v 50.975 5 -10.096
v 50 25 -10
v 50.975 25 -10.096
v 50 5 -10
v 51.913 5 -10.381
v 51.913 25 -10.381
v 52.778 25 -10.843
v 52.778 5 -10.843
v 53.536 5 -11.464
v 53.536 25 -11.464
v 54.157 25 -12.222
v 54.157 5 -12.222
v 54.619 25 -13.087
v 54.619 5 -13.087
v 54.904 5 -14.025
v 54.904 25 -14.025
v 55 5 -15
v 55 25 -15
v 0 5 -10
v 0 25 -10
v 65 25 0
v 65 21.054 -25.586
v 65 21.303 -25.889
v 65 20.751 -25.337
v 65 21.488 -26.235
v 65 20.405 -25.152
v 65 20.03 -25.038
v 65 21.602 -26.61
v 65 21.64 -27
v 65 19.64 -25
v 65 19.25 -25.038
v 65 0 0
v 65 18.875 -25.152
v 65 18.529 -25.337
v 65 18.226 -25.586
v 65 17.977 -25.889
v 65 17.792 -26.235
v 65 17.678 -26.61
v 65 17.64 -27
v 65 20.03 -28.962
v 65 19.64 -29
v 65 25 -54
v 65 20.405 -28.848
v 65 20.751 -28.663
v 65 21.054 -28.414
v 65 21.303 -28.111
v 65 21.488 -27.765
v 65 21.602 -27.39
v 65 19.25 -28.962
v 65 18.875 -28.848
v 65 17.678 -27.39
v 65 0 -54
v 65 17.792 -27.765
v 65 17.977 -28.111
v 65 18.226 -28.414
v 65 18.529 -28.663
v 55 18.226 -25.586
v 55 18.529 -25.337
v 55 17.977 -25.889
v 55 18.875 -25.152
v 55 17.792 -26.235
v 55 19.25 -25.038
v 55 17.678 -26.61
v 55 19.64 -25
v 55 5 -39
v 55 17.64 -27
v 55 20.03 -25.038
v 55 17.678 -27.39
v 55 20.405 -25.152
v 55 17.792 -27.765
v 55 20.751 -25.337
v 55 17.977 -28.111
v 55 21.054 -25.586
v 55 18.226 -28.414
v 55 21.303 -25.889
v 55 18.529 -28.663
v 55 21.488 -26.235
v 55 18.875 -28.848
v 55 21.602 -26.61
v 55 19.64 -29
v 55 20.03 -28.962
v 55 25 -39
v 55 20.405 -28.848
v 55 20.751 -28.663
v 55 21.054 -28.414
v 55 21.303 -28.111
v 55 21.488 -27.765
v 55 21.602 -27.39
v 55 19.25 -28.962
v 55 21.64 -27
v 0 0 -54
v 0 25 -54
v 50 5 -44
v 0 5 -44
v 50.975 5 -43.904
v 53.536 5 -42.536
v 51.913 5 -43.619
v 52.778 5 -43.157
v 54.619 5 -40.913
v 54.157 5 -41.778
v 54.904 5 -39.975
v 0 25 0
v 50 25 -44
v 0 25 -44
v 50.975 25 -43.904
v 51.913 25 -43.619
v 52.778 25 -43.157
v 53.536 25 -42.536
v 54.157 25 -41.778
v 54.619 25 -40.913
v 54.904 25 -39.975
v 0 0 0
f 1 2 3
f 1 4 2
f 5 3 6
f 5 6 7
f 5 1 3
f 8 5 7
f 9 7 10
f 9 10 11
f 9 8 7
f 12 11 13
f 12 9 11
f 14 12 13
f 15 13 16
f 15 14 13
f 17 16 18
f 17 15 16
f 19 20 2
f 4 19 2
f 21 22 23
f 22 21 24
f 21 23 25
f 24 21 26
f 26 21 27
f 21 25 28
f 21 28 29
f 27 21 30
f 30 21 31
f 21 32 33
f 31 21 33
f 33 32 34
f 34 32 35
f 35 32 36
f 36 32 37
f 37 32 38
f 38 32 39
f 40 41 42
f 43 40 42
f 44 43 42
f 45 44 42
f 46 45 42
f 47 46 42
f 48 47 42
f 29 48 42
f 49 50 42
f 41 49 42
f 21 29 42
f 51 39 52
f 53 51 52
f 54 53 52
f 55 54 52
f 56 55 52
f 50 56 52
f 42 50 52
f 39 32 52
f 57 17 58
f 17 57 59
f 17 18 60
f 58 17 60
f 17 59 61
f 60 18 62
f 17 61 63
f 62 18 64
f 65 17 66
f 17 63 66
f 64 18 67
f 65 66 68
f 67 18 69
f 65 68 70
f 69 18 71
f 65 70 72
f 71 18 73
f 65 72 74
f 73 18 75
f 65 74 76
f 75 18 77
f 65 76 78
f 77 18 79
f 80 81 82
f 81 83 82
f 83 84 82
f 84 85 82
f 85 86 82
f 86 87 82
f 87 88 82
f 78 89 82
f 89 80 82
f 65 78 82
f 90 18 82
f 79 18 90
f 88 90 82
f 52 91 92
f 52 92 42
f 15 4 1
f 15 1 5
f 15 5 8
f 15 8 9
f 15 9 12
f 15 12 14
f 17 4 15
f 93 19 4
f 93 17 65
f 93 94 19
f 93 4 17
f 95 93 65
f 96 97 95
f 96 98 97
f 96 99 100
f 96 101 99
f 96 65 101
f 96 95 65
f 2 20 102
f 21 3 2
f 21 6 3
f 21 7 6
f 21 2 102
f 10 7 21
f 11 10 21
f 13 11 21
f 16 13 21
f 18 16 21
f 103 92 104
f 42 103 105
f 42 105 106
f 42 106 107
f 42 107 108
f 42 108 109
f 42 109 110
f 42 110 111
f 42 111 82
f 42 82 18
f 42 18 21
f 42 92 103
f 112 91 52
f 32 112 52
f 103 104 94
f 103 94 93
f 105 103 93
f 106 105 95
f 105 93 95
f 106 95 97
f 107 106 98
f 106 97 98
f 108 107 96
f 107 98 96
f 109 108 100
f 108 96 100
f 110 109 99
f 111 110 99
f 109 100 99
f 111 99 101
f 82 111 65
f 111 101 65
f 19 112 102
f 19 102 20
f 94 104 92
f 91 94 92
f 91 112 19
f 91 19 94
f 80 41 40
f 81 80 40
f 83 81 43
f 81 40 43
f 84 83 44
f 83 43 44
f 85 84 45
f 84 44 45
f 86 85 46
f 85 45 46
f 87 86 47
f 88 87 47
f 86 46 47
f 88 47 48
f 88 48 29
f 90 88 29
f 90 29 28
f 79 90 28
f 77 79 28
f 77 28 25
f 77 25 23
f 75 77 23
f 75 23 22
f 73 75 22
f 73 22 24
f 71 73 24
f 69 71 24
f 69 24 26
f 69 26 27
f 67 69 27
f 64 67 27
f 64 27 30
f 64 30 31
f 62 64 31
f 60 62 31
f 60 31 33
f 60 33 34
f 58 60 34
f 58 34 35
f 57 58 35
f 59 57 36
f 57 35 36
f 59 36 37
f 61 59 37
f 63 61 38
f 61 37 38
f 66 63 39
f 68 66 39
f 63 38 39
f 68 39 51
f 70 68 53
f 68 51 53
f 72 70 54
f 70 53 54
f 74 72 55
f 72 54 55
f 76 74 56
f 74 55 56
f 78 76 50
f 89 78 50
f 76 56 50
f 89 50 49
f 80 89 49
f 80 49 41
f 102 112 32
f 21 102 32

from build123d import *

# Parameters (mm, degrees)
SKETCH1_W           = 65
SKETCH1_H           = 54
BOSS_EXTRUDE1_DEPTH = 25
SKETCH2_W           = 55
SKETCH2_H           = 34
CUT_EXTRUDE1_DEPTH  = 20
SKETCH3_R           = 2
CUT_EXTRUDE2_DEPTH  = 66
FILLET1_R           = 5


with BuildPart() as part:
    # Sketch1 → Boss-Extrude1 (new body)
    with BuildSketch(Plane(origin=(0, 0, 0), x_dir=(1, 0, 0), z_dir=(0, 1, 0))):
        with Locations((32.5, 27)):
            Rectangle(SKETCH1_W, SKETCH1_H)
    extrude(amount=BOSS_EXTRUDE1_DEPTH)

    # Sketch2 → Cut-Extrude1 (cut)
    with BuildSketch(Plane(origin=(0, 25, 0), x_dir=(1, 0, 0), z_dir=(0, 1, 0))):
        with Locations((27.5, 27)):
            Rectangle(SKETCH2_W, SKETCH2_H)
    extrude(amount=-CUT_EXTRUDE1_DEPTH, mode=Mode.SUBTRACT)

    # Sketch3 → Cut-Extrude2 (cut, through all)
    with BuildSketch(Plane(origin=(65, 0, 0), x_dir=(0, 0, -1), z_dir=(1, 0, 0))):
        with Locations((27, 19.64)):
            Circle(SKETCH3_R)
    extrude(amount=-CUT_EXTRUDE2_DEPTH, mode=Mode.SUBTRACT)

    # Fillet1
    fillet1_edges = [part.edges().sort_by_distance(p)[0] for p in [
        (55, 15, -44),
        (55, 15, -10),
    ]]
    fillet(fillet1_edges, radius=FILLET1_R)


solid = part.part
